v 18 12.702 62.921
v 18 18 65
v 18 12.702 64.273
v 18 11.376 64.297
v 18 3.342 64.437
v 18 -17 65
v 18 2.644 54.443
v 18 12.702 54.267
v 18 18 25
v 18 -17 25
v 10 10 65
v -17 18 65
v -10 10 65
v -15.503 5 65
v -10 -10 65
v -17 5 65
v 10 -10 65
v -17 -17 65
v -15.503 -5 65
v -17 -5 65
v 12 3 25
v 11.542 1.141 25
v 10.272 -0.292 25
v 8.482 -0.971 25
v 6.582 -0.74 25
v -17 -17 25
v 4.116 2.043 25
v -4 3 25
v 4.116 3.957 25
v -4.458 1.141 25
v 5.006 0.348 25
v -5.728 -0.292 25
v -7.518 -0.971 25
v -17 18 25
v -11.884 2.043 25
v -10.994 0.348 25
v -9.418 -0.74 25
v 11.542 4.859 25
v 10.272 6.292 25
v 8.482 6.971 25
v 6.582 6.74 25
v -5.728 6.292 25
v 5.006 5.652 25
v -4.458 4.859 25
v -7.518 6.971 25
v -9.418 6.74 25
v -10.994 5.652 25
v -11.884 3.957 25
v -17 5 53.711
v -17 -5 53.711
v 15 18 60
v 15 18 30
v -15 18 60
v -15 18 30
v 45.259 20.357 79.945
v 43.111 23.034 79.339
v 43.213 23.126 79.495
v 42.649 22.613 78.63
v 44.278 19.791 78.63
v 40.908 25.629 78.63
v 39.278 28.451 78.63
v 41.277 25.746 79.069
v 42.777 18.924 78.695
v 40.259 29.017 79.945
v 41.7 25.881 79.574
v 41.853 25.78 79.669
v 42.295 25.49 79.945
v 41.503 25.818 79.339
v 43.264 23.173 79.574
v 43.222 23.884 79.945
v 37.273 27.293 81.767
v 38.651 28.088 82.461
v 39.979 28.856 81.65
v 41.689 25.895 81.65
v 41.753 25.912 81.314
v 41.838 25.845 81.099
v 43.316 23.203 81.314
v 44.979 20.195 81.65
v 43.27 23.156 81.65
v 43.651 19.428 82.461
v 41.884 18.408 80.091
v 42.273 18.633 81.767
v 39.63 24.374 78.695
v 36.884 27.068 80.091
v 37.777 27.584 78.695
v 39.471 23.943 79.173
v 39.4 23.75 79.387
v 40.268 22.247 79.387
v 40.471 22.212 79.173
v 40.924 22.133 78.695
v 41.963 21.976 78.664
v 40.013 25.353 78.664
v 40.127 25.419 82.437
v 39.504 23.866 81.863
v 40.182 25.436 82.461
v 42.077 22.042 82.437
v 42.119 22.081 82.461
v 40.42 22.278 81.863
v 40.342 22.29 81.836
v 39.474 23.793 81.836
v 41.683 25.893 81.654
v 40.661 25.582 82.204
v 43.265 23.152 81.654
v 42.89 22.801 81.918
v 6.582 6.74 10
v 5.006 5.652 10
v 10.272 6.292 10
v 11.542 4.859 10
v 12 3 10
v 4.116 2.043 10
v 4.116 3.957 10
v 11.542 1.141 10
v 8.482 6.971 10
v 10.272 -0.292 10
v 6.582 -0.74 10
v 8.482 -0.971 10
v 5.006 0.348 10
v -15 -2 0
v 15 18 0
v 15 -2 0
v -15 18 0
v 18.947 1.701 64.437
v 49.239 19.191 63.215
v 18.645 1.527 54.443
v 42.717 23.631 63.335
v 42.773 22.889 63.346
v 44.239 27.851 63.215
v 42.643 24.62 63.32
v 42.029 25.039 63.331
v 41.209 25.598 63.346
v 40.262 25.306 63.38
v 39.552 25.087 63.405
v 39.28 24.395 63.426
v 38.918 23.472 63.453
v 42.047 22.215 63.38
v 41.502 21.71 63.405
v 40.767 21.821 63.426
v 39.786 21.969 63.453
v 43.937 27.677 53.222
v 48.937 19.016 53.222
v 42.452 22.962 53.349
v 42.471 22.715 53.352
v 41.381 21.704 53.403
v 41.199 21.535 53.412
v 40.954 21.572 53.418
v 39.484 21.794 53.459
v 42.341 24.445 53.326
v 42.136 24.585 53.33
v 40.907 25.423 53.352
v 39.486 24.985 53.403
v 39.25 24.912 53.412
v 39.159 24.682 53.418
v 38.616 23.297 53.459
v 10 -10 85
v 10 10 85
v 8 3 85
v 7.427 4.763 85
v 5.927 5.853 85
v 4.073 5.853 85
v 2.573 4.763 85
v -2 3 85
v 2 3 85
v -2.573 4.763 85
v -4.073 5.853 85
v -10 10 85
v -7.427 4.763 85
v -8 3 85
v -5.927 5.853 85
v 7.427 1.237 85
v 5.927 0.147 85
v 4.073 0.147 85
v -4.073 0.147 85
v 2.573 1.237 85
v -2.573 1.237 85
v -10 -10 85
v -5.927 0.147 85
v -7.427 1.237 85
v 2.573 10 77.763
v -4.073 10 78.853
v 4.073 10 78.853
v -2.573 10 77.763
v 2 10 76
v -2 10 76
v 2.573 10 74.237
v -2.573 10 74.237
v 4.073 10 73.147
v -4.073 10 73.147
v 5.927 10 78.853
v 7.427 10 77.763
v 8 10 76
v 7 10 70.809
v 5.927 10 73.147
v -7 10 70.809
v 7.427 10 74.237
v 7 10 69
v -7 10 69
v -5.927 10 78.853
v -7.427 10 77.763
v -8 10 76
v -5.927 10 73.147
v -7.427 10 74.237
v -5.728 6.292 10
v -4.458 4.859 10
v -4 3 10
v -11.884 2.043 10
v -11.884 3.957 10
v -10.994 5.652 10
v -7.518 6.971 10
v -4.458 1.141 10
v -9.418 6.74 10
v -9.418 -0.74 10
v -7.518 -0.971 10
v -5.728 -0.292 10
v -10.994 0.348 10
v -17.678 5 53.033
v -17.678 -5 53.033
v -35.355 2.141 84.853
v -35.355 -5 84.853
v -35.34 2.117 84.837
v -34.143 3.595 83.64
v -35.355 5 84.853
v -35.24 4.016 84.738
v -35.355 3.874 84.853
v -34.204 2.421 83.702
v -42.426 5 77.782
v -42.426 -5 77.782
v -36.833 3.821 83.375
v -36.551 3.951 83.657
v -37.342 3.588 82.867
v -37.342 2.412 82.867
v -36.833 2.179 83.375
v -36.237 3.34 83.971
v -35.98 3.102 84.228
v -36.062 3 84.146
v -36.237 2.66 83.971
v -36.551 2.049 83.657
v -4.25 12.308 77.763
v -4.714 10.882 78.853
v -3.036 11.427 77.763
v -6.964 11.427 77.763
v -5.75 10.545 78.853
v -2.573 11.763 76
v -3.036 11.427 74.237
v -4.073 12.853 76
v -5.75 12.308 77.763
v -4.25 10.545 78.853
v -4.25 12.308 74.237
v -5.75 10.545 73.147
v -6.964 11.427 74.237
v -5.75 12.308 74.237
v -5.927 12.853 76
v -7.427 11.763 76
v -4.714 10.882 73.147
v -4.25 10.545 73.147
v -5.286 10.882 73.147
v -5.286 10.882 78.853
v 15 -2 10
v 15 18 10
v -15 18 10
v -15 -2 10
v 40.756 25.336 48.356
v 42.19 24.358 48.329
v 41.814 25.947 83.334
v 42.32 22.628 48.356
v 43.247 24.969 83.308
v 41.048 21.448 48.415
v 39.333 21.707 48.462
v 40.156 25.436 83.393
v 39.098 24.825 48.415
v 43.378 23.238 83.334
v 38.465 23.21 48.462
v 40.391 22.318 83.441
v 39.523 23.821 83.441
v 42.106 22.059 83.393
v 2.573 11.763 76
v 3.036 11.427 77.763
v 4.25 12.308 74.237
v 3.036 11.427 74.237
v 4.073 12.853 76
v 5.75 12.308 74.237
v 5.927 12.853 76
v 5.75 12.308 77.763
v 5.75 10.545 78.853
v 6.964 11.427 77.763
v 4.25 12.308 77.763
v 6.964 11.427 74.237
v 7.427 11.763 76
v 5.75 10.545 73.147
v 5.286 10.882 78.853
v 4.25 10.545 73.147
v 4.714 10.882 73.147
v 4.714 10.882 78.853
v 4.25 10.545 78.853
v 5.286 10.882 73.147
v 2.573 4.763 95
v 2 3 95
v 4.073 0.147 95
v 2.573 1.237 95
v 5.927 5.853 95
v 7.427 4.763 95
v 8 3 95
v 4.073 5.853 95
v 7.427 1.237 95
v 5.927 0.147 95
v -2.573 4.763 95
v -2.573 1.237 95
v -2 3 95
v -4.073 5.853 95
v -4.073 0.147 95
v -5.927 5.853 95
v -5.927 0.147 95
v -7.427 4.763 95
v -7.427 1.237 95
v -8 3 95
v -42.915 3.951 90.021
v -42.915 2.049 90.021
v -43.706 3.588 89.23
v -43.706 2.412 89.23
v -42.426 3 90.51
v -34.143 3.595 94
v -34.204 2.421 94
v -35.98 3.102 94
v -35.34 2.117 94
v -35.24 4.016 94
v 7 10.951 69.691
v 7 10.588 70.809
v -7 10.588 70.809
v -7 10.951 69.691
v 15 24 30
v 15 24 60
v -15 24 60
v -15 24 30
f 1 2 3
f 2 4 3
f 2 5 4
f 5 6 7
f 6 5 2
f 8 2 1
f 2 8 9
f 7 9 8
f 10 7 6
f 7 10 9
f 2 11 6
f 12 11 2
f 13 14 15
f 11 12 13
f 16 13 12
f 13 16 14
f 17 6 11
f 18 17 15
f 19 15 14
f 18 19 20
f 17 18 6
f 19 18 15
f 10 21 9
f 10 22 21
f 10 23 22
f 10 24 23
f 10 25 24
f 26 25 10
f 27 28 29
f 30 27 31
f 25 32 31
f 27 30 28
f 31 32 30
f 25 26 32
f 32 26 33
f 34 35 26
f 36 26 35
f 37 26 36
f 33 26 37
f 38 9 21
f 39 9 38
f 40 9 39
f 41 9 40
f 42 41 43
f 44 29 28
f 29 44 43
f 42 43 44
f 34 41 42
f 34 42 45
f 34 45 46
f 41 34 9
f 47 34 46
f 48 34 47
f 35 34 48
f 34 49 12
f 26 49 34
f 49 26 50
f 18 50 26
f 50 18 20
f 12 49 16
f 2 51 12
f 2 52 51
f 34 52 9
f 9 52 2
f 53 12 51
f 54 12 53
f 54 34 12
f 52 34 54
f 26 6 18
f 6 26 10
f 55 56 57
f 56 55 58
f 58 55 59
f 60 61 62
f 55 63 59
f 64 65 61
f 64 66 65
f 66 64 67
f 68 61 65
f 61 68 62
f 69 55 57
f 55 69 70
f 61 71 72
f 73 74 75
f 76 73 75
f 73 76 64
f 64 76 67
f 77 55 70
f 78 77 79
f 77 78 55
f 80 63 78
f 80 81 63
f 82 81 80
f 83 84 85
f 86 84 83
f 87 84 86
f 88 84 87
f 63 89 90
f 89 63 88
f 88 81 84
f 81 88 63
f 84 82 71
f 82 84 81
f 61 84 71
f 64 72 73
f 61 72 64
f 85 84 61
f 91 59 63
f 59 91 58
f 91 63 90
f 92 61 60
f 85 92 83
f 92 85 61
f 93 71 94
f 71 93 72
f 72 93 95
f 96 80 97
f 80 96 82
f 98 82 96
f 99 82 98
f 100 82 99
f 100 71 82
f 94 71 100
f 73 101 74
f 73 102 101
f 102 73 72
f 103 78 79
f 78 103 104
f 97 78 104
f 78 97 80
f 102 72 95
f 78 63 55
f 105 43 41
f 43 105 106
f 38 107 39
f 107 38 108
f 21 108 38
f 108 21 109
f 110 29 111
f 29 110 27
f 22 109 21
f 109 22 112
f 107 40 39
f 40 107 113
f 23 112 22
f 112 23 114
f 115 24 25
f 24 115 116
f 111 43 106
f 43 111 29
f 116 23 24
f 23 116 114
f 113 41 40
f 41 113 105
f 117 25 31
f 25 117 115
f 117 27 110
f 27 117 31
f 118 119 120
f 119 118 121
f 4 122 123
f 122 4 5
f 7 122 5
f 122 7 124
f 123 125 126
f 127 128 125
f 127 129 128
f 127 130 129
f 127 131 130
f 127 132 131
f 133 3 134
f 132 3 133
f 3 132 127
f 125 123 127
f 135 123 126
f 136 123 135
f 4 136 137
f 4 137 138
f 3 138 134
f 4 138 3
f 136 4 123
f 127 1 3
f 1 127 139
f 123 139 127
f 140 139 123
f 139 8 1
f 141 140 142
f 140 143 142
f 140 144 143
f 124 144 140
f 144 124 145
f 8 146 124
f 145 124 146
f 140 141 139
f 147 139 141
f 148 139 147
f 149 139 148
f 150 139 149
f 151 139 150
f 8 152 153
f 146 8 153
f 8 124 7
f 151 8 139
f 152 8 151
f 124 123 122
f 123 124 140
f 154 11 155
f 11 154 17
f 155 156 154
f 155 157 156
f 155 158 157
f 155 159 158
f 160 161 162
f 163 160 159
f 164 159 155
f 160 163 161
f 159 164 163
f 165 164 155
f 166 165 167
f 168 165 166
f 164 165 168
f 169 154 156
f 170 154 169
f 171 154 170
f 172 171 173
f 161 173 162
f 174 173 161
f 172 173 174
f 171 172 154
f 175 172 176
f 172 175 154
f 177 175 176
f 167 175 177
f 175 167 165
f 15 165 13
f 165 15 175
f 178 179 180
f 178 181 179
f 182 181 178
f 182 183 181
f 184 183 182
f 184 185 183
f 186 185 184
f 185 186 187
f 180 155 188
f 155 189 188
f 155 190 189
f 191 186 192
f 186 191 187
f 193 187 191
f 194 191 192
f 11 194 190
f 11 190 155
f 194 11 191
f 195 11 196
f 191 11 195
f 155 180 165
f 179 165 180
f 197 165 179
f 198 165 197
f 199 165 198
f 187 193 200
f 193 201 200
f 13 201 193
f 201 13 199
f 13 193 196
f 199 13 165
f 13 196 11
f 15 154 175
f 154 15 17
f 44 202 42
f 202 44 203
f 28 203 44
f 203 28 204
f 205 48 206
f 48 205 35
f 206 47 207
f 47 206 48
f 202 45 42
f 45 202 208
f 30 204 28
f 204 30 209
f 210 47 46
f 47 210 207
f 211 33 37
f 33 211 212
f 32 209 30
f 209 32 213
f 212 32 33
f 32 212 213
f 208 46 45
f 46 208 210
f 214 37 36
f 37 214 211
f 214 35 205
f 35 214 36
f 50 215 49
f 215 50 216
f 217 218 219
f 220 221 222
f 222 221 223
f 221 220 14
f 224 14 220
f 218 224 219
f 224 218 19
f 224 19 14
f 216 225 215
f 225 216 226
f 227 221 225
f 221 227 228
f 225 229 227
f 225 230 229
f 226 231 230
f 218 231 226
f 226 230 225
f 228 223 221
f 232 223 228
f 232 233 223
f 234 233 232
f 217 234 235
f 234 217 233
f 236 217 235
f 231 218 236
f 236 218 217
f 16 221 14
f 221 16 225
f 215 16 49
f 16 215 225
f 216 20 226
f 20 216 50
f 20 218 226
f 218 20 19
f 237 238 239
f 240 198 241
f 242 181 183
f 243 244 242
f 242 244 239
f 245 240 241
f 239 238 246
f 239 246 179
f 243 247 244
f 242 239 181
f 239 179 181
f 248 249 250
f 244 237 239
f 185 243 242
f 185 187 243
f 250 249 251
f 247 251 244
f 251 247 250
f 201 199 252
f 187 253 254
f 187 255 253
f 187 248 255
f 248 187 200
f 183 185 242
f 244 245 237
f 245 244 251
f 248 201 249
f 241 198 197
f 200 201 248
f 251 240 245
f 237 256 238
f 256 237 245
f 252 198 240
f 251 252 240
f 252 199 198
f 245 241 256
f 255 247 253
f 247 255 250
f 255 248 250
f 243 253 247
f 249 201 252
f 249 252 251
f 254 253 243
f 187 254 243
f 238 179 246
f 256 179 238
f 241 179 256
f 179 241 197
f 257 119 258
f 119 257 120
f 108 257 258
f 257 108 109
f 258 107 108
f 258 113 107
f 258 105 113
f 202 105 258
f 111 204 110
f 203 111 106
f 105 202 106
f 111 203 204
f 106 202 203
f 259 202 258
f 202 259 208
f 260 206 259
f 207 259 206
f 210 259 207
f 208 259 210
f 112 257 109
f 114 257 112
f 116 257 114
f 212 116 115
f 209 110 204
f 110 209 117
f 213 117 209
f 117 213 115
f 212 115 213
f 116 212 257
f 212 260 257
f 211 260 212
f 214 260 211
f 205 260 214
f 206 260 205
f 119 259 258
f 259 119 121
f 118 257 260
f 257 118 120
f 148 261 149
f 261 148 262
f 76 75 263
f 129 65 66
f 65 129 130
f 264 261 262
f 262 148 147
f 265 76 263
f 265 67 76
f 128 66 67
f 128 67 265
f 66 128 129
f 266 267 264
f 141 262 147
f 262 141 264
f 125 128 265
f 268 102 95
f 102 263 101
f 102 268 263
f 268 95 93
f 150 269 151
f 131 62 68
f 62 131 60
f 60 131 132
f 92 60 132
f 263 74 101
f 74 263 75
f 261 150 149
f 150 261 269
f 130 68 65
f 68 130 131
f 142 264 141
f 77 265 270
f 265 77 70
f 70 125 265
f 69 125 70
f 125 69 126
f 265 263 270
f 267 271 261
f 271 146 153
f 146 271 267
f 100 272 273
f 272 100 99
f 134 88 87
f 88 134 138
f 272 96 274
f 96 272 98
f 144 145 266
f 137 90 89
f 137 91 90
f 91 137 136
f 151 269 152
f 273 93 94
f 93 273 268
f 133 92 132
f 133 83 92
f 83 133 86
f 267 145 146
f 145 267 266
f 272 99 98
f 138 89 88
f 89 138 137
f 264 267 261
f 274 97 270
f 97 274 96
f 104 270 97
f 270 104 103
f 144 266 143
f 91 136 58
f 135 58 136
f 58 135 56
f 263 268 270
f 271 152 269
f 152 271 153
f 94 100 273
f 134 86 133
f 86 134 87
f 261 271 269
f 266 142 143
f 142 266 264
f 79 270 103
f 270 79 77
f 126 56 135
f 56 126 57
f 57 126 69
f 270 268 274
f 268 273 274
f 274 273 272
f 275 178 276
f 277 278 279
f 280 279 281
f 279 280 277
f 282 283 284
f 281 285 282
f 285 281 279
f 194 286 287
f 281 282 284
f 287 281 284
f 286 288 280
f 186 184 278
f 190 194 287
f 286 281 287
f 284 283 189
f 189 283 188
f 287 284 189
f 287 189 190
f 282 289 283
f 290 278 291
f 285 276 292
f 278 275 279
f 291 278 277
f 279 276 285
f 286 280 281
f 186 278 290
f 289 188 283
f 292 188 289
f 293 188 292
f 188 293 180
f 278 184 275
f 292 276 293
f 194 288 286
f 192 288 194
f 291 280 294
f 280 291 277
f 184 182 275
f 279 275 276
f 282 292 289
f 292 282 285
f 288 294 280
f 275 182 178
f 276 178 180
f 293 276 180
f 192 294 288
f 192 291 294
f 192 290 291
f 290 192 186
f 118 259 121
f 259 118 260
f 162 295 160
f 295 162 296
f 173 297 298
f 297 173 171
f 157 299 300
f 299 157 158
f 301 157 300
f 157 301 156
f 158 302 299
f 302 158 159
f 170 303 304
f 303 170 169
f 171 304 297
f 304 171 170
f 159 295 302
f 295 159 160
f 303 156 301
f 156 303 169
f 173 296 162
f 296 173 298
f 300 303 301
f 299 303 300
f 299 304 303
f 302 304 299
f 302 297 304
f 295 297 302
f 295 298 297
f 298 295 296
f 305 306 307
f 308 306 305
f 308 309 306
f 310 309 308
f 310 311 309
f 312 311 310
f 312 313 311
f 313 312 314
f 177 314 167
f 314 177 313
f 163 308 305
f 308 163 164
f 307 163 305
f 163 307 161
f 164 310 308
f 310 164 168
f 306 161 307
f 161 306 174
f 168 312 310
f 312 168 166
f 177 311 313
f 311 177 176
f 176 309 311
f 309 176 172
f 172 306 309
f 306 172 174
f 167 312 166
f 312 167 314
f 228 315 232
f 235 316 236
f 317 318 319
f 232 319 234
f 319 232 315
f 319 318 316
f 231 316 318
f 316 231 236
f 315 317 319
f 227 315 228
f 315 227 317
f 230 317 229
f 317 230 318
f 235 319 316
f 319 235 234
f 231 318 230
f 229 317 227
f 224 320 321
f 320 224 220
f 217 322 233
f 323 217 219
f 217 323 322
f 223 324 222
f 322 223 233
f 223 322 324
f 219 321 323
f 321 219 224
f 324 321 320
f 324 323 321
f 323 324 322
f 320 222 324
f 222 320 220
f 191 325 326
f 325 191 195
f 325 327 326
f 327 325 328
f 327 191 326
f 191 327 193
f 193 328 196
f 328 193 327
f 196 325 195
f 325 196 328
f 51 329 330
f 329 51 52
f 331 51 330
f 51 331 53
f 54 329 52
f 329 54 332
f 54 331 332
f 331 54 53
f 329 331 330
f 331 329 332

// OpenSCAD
//!OpenSCAD




color([0,0,0]) {
  rotate([0, 0, 0]){
    translate([-17, -17, 25]){
      cube([35, 35, 40], center=false);
    }
  }
}
color([0.4,0.4,0.4]) {
  rotate([-90, 15, 30]){
    translate([25, -90, -5]){
      cylinder(r1=2, r2=2, h=10, center=false);
    }
  }
}
color([1,1,1]) {
  rotate([0, 0, 0]){
    translate([8, 3, 0]){
      cylinder(r1=4, r2=4, h=25, center=false);
    }
  }
}
color([0,0,0]) {
  rotate([0, 2, 30]){
    translate([15, -8, 55]){
      cube([35, 10, 10], center=false);
    }
  }
}
color([1,1,1]) {
  rotate([0, 0, 0]){
    translate([-10, -10, 25]){
      cube([20, 20, 60], center=false);
    }
  }
}
color([1,1,1]) {
  rotate([0, 0, 0]){
    translate([-8, 3, 2]){
      cylinder(r1=4, r2=4, h=25, center=false);
    }
  }
}
color([0,0,0]) {
  rotate([0, 45, 0]){
    translate([-85, -5, 25]){
      cube([35, 10, 10], center=false);
    }
  }
}
color([0,0,0]) {
  rotate([0, 0, 0]){
    translate([-5, 10, 76]){
      sphere(r=3);
    }
  }
}
color([0,0,0]) {
  rotate([0, 0, 0]){
    translate([0, -2, 0]){
      cube([15, 20, 10], center=false);
    }
  }
}
color([0.8,0.4,0]) {
  rotate([0, 2, 30]){
    translate([45, 0, 50]){
      cylinder(r1=2, r2=2, h=35, center=false);
    }
  }
}
color([0,0,0]) {
  rotate([0, 0, 0]){
    translate([5, 10, 76]){
      sphere(r=3);
    }
  }
}
color([0,0,0]) {
  rotate([0, 0, 0]){
    translate([-15, -2, 0]){
      cube([15, 20, 10], center=false);
    }
  }
}
color([1,1,1]) {
  rotate([0, 0, 0]){
    translate([5, 3, 80]){
      cylinder(r1=3, r2=3, h=15, center=false);
    }
  }
}
color([1,1,1]) {
  translate([-5, 3, 80]){
    cylinder(r1=3, r2=3, h=15, center=false);
  }
}
color([0,0,0]) {
  rotate([0, -45, 0]){
    translate([33, 3, 80]){
      cylinder(r1=1, r2=1, h=14, center=false);
    }
  }
}
color([0,0,0]) {
  rotate([0, 0, 105]){
    translate([12, 33, 80]){
      cylinder(r1=1, r2=1, h=14, center=false);
    }
  }
}
color([0,0,0]) {
  rotate([90, 90, 90]){
    translate([-70, 10, -7]){
      cylinder(r1=1, r2=1, h=14, center=false);
    }
  }
}
color([1,1,1]) {
  rotate([0, 0, 0]){
    translate([-15, -16, 30]){
      cube([30, 40, 30], center=false);
    }
  }
}
